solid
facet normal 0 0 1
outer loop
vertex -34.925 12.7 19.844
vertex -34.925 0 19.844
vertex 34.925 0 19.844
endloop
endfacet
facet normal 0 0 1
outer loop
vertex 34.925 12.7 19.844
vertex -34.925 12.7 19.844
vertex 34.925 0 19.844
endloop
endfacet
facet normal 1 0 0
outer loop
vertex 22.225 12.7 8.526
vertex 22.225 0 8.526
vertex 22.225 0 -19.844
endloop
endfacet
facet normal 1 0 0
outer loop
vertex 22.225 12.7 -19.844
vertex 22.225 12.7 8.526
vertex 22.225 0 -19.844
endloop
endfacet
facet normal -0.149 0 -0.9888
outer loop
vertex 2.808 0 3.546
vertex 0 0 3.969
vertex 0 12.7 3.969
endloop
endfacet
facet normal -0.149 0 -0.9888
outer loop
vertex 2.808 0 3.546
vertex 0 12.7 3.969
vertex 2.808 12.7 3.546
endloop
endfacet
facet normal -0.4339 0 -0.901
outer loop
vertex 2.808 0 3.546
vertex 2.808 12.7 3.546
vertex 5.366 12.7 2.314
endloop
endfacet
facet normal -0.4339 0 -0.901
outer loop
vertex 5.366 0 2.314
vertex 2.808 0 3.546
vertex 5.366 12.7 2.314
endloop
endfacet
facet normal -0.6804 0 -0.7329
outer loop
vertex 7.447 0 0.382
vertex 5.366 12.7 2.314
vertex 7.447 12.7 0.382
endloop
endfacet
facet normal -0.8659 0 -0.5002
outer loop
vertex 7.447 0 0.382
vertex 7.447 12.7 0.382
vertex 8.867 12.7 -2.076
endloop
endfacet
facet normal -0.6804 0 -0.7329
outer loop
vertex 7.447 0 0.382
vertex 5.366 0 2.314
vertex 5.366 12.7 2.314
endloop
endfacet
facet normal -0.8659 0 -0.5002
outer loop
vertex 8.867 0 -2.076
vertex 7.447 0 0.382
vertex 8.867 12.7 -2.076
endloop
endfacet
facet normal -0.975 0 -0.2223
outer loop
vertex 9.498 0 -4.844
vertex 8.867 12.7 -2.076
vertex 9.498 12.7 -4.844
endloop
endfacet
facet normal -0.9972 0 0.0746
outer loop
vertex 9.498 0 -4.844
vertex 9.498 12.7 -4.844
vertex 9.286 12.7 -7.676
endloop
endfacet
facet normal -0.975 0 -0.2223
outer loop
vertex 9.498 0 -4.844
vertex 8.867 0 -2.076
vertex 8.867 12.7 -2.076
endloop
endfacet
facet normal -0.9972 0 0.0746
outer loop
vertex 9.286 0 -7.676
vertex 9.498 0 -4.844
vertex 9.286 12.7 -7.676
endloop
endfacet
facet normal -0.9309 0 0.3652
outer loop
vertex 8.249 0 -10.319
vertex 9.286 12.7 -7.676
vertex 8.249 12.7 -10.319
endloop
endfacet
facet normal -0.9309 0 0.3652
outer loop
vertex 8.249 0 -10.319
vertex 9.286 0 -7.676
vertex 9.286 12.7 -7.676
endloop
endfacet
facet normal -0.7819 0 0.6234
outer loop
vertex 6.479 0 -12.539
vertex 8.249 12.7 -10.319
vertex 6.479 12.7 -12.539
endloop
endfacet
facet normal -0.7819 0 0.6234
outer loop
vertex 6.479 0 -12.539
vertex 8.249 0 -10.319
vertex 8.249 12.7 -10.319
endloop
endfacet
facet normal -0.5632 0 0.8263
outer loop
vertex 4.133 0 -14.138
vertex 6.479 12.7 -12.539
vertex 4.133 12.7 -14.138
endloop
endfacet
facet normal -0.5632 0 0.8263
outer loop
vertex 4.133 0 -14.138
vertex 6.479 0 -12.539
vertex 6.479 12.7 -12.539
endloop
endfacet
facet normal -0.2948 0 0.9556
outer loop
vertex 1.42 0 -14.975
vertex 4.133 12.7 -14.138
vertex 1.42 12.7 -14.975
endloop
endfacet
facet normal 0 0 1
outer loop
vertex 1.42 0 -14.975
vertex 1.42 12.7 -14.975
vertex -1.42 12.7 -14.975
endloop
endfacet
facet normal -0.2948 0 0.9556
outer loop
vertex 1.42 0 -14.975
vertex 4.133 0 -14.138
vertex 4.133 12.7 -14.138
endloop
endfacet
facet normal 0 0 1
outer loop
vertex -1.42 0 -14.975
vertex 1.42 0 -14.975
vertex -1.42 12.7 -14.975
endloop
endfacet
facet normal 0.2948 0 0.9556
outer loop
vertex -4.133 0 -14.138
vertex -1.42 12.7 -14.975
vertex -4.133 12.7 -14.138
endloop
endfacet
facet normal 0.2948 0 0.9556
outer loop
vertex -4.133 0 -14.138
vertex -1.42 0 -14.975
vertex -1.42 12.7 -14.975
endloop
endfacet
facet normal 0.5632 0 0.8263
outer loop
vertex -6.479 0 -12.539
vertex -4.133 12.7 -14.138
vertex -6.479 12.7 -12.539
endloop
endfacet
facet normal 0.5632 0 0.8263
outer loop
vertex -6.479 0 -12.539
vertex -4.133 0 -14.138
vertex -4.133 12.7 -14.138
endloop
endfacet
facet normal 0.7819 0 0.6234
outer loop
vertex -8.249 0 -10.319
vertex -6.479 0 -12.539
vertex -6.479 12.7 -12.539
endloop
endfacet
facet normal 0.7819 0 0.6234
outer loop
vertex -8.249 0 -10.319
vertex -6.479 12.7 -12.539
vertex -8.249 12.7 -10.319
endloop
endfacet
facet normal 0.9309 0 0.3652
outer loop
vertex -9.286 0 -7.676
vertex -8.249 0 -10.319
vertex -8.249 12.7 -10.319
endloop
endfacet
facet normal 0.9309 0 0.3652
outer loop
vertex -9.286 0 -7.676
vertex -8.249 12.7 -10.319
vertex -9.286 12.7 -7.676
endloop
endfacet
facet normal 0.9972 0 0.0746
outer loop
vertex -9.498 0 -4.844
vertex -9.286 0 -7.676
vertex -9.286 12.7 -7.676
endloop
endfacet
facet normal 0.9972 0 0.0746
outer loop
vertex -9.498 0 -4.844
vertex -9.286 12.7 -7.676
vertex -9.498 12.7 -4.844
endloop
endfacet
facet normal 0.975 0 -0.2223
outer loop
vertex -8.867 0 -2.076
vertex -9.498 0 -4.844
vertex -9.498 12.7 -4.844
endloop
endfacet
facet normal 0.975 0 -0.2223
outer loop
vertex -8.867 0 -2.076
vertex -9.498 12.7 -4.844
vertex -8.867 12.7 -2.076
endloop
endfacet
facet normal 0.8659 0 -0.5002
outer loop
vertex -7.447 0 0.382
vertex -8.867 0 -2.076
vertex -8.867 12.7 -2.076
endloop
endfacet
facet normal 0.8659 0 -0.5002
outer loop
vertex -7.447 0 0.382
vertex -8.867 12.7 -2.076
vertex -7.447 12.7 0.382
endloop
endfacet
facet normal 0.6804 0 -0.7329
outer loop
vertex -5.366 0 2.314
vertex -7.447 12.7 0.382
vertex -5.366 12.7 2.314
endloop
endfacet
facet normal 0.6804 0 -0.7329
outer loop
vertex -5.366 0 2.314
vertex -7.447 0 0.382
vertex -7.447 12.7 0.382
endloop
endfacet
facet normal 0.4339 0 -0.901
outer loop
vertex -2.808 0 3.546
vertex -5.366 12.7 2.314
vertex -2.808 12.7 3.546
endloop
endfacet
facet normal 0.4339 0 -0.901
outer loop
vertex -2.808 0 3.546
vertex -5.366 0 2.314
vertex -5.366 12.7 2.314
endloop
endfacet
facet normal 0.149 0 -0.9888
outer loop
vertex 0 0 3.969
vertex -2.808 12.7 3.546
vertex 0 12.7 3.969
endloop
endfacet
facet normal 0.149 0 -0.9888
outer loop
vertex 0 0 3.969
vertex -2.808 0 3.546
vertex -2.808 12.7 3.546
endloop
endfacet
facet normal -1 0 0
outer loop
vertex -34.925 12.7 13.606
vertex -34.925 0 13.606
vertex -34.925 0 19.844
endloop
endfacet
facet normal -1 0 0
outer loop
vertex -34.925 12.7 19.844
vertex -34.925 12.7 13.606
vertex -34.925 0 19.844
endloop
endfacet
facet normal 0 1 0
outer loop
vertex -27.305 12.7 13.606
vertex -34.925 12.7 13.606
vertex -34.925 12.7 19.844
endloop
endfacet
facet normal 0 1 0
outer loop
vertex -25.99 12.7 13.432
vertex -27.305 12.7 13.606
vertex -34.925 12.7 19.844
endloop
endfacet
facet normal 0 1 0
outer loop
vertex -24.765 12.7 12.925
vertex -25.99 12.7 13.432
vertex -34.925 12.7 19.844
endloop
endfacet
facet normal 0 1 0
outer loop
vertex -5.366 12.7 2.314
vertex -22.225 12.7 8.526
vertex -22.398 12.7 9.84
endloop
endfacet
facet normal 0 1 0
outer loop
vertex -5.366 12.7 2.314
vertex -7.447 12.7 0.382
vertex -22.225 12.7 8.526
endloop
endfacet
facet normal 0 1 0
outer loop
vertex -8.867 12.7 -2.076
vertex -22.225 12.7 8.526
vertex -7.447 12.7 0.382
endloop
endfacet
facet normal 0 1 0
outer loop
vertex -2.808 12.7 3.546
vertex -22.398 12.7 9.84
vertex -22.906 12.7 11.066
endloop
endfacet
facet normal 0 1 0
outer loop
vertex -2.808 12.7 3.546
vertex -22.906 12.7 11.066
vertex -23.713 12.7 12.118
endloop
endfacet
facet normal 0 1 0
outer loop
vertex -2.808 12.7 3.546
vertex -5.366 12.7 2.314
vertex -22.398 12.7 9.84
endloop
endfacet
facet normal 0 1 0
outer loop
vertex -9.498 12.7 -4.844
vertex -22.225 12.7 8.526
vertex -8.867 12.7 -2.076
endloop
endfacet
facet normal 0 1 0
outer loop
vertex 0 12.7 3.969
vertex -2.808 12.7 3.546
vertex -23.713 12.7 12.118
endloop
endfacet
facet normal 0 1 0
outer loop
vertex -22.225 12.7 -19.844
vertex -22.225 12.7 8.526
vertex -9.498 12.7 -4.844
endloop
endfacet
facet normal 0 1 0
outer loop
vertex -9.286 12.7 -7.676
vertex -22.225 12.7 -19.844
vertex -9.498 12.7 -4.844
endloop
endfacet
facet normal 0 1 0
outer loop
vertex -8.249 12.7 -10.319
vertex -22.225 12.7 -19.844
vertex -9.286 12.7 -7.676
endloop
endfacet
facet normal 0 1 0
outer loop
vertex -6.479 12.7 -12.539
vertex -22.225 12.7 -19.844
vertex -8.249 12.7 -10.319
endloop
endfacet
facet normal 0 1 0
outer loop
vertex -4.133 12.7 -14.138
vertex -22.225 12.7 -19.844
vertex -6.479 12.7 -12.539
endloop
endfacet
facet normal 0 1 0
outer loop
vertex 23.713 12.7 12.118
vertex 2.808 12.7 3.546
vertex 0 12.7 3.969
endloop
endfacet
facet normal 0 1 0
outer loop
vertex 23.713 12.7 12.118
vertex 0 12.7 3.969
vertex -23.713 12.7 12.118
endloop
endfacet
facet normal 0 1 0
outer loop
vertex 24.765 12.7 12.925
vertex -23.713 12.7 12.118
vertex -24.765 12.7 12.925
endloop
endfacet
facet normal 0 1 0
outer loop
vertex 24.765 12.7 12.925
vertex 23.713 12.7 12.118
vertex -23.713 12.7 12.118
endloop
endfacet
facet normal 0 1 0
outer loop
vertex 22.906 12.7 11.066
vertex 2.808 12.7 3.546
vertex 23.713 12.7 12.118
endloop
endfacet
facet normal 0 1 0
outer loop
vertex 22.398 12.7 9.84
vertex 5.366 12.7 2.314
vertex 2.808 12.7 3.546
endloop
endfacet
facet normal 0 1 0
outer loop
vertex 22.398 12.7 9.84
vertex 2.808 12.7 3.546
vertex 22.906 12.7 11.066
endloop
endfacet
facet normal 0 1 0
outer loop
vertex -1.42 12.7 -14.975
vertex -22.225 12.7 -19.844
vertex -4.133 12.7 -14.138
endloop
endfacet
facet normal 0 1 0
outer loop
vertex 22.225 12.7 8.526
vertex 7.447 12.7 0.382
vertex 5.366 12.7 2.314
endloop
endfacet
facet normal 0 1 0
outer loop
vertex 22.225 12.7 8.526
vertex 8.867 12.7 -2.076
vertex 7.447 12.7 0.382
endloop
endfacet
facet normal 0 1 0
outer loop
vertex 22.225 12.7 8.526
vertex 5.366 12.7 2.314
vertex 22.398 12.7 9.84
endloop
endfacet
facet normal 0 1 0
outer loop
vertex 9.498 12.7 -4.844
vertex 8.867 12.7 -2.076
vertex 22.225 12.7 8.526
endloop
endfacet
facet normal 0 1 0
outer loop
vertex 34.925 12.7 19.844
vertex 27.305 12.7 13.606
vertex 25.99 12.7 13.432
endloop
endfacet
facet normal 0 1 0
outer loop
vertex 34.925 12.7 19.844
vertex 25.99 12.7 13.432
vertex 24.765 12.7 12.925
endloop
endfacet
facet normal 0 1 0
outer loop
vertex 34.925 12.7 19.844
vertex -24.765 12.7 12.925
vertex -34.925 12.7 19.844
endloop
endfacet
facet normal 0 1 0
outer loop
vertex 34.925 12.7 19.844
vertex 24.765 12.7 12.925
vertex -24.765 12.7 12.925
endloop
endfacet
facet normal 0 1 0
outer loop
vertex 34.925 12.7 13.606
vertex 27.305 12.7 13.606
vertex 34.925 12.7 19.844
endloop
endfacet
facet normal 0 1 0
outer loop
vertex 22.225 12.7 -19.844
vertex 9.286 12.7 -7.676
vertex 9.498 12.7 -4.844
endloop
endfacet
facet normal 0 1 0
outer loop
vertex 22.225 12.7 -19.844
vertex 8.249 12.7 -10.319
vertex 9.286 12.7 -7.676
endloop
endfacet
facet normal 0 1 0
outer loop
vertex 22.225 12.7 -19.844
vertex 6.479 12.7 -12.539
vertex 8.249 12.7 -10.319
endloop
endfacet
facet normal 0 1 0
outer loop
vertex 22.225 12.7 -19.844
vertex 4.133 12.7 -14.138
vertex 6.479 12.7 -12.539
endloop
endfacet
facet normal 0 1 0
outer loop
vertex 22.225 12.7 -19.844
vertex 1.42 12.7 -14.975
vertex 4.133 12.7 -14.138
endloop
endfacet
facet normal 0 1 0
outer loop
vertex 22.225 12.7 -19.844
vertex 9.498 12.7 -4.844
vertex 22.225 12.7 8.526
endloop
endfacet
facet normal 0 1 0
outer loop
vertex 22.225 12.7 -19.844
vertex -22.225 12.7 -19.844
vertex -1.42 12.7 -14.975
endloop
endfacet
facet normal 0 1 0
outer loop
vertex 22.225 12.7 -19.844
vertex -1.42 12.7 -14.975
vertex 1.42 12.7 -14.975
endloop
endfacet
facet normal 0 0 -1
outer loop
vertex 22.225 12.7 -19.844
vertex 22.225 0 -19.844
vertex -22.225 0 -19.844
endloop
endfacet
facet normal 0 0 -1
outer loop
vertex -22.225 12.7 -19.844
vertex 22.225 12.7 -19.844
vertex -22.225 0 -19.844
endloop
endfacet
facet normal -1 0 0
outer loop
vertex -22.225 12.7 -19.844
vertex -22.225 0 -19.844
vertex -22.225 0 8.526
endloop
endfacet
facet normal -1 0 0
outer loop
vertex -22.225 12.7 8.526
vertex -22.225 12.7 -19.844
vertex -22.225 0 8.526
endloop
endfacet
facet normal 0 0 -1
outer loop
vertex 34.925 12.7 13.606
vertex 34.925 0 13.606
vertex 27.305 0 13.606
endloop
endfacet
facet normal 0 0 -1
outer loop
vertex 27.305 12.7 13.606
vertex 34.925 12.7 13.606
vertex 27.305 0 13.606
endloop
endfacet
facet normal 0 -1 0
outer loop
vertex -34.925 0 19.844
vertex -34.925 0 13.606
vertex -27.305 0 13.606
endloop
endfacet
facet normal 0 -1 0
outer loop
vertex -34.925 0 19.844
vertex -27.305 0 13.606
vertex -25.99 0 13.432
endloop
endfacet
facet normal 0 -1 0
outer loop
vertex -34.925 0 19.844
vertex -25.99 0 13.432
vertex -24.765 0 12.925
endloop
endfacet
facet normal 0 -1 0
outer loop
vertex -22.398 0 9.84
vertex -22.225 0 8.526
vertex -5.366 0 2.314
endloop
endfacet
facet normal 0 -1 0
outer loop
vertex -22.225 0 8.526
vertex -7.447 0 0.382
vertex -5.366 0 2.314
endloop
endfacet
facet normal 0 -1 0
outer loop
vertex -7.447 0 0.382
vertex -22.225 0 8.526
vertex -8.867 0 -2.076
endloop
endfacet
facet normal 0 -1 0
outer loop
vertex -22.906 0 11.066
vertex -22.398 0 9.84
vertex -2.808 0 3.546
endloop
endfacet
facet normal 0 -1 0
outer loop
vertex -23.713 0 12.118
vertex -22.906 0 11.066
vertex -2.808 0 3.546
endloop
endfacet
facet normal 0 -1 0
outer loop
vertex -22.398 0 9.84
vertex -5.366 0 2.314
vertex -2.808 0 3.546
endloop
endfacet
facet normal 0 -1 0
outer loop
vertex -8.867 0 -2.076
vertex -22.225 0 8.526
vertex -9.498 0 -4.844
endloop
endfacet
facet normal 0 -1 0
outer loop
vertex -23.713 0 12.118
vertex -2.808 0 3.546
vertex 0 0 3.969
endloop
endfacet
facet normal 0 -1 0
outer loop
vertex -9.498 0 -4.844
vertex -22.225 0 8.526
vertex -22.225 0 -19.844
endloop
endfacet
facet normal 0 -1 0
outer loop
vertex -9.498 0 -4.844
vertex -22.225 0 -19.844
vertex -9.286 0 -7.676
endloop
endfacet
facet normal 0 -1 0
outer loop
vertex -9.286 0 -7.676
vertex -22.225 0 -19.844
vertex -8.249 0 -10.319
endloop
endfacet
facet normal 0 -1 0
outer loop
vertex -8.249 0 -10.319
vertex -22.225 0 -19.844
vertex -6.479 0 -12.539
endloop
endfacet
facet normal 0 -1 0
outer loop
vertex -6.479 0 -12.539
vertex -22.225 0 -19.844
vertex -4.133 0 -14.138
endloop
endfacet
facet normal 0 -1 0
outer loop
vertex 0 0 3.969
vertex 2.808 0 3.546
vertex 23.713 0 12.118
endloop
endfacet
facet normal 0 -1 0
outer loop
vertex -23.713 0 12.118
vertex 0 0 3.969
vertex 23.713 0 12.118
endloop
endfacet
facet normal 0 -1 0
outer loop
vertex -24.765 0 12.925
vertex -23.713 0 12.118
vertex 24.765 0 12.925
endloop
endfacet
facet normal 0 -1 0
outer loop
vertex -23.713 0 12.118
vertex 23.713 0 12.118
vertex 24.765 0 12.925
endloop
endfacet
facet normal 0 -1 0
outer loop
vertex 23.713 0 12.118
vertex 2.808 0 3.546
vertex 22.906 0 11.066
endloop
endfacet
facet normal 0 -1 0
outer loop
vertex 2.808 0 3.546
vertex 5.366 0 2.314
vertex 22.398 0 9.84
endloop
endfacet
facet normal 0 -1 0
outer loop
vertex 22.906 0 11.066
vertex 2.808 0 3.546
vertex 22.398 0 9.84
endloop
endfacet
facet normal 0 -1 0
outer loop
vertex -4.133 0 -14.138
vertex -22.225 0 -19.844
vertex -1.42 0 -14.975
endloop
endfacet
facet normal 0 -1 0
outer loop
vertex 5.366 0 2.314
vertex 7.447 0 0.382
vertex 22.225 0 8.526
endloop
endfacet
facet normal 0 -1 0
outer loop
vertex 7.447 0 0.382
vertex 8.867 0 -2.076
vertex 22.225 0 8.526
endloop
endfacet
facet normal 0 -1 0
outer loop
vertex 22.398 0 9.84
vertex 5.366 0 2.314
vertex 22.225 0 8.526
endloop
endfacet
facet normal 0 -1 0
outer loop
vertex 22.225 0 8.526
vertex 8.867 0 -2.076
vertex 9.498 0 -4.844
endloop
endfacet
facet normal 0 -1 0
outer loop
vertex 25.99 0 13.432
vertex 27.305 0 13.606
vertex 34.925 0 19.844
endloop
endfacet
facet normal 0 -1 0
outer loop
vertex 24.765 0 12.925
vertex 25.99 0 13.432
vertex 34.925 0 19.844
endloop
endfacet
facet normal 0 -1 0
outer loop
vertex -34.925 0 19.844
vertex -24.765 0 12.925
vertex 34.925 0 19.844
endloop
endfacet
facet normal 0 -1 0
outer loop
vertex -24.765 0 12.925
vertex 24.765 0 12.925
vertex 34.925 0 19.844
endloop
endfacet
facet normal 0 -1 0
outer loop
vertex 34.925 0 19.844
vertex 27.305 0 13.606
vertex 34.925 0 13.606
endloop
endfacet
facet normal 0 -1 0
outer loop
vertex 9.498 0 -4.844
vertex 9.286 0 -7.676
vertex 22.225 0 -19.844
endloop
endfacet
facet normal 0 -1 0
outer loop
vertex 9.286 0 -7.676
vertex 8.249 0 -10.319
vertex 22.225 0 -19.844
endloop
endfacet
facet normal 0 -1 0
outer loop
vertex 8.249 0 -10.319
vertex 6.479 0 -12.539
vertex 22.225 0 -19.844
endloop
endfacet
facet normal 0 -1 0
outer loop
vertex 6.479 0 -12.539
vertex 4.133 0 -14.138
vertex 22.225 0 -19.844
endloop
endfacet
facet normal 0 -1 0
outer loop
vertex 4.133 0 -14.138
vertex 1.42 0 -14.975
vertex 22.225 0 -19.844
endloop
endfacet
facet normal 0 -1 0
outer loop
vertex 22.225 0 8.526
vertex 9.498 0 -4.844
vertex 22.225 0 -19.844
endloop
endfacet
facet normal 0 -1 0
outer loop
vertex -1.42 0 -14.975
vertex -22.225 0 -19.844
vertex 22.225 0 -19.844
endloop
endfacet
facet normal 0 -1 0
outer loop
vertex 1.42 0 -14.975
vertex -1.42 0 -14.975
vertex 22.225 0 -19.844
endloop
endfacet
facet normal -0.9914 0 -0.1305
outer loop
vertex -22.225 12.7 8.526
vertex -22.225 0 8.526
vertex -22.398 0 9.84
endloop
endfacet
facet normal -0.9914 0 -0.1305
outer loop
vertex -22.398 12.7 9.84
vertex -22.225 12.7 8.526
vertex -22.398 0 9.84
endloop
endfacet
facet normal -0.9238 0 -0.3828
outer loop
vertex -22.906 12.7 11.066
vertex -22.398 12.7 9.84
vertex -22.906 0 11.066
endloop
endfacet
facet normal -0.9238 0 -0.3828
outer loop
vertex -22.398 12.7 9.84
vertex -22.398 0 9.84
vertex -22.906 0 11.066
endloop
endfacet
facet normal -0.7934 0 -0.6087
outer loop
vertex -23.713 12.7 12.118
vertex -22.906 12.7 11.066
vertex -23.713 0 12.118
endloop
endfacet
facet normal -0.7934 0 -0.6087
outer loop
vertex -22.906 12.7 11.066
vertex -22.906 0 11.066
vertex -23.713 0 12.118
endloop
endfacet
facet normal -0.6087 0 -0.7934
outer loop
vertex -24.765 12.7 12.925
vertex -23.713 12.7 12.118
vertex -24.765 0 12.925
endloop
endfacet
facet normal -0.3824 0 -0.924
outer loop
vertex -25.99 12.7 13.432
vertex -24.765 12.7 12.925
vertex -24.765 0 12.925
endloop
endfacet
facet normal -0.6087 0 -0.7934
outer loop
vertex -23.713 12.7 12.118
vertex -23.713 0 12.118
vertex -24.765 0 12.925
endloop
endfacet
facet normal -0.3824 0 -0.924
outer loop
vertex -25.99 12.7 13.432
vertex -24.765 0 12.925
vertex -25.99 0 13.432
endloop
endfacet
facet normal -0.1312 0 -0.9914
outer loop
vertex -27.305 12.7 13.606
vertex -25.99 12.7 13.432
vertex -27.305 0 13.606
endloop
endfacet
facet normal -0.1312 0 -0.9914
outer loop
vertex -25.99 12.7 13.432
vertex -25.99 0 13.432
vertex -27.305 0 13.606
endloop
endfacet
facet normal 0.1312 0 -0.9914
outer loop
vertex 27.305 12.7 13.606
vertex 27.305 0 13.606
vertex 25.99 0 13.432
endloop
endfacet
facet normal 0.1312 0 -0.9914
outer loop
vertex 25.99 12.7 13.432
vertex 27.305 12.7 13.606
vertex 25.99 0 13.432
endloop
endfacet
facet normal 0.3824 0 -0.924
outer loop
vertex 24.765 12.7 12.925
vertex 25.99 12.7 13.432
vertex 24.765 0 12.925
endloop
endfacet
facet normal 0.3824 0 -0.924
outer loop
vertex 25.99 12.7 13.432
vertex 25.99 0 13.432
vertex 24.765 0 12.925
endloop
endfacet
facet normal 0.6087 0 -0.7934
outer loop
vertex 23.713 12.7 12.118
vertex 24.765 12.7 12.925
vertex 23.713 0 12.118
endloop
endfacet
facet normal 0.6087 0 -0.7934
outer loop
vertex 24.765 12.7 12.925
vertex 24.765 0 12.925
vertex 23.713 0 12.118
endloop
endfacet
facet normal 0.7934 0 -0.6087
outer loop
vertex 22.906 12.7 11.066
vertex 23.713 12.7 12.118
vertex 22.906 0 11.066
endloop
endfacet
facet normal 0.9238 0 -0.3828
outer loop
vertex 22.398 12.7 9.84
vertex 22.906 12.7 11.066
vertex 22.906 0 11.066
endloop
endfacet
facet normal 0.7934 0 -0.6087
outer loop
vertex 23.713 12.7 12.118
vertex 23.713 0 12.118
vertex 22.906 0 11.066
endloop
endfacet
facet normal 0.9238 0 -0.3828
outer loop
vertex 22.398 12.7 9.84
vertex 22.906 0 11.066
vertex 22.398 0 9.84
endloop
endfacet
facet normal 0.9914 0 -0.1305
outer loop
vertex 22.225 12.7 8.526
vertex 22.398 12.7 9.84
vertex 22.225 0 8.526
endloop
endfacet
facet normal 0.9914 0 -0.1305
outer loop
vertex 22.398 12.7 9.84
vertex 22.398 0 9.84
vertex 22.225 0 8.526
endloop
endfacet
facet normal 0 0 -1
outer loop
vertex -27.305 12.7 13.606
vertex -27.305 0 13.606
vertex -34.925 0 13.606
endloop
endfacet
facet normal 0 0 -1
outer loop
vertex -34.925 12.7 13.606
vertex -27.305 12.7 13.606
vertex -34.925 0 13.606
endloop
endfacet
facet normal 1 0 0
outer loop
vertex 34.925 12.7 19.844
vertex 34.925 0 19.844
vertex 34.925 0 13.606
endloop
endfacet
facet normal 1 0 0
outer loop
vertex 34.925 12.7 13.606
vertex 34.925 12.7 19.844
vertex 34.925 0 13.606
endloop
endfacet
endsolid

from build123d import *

# Parameters (mm, degrees)
SKETCH1_R           = 9.525
BOSS_EXTRUDE1_DEPTH = 12.7


with BuildPart() as part:
    # Sketch1 → Boss-Extrude1 (new body)
    with BuildSketch(Plane(origin=(0, 0, 0), x_dir=(1, 0, 0), z_dir=(0, 1, 0))):
        with BuildLine():
            Line((22.225, -8.525568981), (22.225, 19.84375))
            Line((22.225, 19.84375), (-22.225, 19.84375))
            Line((-22.225, 19.84375), (-22.225, -8.525568981))
            ThreePointArc((-22.225, -8.525568981), (-23.712897552, -12.117671429), (-27.305, -13.605568981))
            Line((-27.305, -13.605568981), (-34.925, -13.605568981))
            Line((-34.925, -13.605568981), (-34.925, -19.84375))
            Line((-34.925, -19.84375), (34.925, -19.84375))
            Line((34.925, -19.84375), (34.925, -13.605568981))
            Line((34.925, -13.605568981), (27.305, -13.605568981))
            ThreePointArc((27.305, -13.605568981), (23.712897552, -12.117671429), (22.225, -8.525568981))
        make_face()
        with Locations(Location((0, 5.55625, 0), (0, 0, 270))):
            Circle(SKETCH1_R, mode=Mode.SUBTRACT)
    extrude(amount=BOSS_EXTRUDE1_DEPTH)


solid = part.part
